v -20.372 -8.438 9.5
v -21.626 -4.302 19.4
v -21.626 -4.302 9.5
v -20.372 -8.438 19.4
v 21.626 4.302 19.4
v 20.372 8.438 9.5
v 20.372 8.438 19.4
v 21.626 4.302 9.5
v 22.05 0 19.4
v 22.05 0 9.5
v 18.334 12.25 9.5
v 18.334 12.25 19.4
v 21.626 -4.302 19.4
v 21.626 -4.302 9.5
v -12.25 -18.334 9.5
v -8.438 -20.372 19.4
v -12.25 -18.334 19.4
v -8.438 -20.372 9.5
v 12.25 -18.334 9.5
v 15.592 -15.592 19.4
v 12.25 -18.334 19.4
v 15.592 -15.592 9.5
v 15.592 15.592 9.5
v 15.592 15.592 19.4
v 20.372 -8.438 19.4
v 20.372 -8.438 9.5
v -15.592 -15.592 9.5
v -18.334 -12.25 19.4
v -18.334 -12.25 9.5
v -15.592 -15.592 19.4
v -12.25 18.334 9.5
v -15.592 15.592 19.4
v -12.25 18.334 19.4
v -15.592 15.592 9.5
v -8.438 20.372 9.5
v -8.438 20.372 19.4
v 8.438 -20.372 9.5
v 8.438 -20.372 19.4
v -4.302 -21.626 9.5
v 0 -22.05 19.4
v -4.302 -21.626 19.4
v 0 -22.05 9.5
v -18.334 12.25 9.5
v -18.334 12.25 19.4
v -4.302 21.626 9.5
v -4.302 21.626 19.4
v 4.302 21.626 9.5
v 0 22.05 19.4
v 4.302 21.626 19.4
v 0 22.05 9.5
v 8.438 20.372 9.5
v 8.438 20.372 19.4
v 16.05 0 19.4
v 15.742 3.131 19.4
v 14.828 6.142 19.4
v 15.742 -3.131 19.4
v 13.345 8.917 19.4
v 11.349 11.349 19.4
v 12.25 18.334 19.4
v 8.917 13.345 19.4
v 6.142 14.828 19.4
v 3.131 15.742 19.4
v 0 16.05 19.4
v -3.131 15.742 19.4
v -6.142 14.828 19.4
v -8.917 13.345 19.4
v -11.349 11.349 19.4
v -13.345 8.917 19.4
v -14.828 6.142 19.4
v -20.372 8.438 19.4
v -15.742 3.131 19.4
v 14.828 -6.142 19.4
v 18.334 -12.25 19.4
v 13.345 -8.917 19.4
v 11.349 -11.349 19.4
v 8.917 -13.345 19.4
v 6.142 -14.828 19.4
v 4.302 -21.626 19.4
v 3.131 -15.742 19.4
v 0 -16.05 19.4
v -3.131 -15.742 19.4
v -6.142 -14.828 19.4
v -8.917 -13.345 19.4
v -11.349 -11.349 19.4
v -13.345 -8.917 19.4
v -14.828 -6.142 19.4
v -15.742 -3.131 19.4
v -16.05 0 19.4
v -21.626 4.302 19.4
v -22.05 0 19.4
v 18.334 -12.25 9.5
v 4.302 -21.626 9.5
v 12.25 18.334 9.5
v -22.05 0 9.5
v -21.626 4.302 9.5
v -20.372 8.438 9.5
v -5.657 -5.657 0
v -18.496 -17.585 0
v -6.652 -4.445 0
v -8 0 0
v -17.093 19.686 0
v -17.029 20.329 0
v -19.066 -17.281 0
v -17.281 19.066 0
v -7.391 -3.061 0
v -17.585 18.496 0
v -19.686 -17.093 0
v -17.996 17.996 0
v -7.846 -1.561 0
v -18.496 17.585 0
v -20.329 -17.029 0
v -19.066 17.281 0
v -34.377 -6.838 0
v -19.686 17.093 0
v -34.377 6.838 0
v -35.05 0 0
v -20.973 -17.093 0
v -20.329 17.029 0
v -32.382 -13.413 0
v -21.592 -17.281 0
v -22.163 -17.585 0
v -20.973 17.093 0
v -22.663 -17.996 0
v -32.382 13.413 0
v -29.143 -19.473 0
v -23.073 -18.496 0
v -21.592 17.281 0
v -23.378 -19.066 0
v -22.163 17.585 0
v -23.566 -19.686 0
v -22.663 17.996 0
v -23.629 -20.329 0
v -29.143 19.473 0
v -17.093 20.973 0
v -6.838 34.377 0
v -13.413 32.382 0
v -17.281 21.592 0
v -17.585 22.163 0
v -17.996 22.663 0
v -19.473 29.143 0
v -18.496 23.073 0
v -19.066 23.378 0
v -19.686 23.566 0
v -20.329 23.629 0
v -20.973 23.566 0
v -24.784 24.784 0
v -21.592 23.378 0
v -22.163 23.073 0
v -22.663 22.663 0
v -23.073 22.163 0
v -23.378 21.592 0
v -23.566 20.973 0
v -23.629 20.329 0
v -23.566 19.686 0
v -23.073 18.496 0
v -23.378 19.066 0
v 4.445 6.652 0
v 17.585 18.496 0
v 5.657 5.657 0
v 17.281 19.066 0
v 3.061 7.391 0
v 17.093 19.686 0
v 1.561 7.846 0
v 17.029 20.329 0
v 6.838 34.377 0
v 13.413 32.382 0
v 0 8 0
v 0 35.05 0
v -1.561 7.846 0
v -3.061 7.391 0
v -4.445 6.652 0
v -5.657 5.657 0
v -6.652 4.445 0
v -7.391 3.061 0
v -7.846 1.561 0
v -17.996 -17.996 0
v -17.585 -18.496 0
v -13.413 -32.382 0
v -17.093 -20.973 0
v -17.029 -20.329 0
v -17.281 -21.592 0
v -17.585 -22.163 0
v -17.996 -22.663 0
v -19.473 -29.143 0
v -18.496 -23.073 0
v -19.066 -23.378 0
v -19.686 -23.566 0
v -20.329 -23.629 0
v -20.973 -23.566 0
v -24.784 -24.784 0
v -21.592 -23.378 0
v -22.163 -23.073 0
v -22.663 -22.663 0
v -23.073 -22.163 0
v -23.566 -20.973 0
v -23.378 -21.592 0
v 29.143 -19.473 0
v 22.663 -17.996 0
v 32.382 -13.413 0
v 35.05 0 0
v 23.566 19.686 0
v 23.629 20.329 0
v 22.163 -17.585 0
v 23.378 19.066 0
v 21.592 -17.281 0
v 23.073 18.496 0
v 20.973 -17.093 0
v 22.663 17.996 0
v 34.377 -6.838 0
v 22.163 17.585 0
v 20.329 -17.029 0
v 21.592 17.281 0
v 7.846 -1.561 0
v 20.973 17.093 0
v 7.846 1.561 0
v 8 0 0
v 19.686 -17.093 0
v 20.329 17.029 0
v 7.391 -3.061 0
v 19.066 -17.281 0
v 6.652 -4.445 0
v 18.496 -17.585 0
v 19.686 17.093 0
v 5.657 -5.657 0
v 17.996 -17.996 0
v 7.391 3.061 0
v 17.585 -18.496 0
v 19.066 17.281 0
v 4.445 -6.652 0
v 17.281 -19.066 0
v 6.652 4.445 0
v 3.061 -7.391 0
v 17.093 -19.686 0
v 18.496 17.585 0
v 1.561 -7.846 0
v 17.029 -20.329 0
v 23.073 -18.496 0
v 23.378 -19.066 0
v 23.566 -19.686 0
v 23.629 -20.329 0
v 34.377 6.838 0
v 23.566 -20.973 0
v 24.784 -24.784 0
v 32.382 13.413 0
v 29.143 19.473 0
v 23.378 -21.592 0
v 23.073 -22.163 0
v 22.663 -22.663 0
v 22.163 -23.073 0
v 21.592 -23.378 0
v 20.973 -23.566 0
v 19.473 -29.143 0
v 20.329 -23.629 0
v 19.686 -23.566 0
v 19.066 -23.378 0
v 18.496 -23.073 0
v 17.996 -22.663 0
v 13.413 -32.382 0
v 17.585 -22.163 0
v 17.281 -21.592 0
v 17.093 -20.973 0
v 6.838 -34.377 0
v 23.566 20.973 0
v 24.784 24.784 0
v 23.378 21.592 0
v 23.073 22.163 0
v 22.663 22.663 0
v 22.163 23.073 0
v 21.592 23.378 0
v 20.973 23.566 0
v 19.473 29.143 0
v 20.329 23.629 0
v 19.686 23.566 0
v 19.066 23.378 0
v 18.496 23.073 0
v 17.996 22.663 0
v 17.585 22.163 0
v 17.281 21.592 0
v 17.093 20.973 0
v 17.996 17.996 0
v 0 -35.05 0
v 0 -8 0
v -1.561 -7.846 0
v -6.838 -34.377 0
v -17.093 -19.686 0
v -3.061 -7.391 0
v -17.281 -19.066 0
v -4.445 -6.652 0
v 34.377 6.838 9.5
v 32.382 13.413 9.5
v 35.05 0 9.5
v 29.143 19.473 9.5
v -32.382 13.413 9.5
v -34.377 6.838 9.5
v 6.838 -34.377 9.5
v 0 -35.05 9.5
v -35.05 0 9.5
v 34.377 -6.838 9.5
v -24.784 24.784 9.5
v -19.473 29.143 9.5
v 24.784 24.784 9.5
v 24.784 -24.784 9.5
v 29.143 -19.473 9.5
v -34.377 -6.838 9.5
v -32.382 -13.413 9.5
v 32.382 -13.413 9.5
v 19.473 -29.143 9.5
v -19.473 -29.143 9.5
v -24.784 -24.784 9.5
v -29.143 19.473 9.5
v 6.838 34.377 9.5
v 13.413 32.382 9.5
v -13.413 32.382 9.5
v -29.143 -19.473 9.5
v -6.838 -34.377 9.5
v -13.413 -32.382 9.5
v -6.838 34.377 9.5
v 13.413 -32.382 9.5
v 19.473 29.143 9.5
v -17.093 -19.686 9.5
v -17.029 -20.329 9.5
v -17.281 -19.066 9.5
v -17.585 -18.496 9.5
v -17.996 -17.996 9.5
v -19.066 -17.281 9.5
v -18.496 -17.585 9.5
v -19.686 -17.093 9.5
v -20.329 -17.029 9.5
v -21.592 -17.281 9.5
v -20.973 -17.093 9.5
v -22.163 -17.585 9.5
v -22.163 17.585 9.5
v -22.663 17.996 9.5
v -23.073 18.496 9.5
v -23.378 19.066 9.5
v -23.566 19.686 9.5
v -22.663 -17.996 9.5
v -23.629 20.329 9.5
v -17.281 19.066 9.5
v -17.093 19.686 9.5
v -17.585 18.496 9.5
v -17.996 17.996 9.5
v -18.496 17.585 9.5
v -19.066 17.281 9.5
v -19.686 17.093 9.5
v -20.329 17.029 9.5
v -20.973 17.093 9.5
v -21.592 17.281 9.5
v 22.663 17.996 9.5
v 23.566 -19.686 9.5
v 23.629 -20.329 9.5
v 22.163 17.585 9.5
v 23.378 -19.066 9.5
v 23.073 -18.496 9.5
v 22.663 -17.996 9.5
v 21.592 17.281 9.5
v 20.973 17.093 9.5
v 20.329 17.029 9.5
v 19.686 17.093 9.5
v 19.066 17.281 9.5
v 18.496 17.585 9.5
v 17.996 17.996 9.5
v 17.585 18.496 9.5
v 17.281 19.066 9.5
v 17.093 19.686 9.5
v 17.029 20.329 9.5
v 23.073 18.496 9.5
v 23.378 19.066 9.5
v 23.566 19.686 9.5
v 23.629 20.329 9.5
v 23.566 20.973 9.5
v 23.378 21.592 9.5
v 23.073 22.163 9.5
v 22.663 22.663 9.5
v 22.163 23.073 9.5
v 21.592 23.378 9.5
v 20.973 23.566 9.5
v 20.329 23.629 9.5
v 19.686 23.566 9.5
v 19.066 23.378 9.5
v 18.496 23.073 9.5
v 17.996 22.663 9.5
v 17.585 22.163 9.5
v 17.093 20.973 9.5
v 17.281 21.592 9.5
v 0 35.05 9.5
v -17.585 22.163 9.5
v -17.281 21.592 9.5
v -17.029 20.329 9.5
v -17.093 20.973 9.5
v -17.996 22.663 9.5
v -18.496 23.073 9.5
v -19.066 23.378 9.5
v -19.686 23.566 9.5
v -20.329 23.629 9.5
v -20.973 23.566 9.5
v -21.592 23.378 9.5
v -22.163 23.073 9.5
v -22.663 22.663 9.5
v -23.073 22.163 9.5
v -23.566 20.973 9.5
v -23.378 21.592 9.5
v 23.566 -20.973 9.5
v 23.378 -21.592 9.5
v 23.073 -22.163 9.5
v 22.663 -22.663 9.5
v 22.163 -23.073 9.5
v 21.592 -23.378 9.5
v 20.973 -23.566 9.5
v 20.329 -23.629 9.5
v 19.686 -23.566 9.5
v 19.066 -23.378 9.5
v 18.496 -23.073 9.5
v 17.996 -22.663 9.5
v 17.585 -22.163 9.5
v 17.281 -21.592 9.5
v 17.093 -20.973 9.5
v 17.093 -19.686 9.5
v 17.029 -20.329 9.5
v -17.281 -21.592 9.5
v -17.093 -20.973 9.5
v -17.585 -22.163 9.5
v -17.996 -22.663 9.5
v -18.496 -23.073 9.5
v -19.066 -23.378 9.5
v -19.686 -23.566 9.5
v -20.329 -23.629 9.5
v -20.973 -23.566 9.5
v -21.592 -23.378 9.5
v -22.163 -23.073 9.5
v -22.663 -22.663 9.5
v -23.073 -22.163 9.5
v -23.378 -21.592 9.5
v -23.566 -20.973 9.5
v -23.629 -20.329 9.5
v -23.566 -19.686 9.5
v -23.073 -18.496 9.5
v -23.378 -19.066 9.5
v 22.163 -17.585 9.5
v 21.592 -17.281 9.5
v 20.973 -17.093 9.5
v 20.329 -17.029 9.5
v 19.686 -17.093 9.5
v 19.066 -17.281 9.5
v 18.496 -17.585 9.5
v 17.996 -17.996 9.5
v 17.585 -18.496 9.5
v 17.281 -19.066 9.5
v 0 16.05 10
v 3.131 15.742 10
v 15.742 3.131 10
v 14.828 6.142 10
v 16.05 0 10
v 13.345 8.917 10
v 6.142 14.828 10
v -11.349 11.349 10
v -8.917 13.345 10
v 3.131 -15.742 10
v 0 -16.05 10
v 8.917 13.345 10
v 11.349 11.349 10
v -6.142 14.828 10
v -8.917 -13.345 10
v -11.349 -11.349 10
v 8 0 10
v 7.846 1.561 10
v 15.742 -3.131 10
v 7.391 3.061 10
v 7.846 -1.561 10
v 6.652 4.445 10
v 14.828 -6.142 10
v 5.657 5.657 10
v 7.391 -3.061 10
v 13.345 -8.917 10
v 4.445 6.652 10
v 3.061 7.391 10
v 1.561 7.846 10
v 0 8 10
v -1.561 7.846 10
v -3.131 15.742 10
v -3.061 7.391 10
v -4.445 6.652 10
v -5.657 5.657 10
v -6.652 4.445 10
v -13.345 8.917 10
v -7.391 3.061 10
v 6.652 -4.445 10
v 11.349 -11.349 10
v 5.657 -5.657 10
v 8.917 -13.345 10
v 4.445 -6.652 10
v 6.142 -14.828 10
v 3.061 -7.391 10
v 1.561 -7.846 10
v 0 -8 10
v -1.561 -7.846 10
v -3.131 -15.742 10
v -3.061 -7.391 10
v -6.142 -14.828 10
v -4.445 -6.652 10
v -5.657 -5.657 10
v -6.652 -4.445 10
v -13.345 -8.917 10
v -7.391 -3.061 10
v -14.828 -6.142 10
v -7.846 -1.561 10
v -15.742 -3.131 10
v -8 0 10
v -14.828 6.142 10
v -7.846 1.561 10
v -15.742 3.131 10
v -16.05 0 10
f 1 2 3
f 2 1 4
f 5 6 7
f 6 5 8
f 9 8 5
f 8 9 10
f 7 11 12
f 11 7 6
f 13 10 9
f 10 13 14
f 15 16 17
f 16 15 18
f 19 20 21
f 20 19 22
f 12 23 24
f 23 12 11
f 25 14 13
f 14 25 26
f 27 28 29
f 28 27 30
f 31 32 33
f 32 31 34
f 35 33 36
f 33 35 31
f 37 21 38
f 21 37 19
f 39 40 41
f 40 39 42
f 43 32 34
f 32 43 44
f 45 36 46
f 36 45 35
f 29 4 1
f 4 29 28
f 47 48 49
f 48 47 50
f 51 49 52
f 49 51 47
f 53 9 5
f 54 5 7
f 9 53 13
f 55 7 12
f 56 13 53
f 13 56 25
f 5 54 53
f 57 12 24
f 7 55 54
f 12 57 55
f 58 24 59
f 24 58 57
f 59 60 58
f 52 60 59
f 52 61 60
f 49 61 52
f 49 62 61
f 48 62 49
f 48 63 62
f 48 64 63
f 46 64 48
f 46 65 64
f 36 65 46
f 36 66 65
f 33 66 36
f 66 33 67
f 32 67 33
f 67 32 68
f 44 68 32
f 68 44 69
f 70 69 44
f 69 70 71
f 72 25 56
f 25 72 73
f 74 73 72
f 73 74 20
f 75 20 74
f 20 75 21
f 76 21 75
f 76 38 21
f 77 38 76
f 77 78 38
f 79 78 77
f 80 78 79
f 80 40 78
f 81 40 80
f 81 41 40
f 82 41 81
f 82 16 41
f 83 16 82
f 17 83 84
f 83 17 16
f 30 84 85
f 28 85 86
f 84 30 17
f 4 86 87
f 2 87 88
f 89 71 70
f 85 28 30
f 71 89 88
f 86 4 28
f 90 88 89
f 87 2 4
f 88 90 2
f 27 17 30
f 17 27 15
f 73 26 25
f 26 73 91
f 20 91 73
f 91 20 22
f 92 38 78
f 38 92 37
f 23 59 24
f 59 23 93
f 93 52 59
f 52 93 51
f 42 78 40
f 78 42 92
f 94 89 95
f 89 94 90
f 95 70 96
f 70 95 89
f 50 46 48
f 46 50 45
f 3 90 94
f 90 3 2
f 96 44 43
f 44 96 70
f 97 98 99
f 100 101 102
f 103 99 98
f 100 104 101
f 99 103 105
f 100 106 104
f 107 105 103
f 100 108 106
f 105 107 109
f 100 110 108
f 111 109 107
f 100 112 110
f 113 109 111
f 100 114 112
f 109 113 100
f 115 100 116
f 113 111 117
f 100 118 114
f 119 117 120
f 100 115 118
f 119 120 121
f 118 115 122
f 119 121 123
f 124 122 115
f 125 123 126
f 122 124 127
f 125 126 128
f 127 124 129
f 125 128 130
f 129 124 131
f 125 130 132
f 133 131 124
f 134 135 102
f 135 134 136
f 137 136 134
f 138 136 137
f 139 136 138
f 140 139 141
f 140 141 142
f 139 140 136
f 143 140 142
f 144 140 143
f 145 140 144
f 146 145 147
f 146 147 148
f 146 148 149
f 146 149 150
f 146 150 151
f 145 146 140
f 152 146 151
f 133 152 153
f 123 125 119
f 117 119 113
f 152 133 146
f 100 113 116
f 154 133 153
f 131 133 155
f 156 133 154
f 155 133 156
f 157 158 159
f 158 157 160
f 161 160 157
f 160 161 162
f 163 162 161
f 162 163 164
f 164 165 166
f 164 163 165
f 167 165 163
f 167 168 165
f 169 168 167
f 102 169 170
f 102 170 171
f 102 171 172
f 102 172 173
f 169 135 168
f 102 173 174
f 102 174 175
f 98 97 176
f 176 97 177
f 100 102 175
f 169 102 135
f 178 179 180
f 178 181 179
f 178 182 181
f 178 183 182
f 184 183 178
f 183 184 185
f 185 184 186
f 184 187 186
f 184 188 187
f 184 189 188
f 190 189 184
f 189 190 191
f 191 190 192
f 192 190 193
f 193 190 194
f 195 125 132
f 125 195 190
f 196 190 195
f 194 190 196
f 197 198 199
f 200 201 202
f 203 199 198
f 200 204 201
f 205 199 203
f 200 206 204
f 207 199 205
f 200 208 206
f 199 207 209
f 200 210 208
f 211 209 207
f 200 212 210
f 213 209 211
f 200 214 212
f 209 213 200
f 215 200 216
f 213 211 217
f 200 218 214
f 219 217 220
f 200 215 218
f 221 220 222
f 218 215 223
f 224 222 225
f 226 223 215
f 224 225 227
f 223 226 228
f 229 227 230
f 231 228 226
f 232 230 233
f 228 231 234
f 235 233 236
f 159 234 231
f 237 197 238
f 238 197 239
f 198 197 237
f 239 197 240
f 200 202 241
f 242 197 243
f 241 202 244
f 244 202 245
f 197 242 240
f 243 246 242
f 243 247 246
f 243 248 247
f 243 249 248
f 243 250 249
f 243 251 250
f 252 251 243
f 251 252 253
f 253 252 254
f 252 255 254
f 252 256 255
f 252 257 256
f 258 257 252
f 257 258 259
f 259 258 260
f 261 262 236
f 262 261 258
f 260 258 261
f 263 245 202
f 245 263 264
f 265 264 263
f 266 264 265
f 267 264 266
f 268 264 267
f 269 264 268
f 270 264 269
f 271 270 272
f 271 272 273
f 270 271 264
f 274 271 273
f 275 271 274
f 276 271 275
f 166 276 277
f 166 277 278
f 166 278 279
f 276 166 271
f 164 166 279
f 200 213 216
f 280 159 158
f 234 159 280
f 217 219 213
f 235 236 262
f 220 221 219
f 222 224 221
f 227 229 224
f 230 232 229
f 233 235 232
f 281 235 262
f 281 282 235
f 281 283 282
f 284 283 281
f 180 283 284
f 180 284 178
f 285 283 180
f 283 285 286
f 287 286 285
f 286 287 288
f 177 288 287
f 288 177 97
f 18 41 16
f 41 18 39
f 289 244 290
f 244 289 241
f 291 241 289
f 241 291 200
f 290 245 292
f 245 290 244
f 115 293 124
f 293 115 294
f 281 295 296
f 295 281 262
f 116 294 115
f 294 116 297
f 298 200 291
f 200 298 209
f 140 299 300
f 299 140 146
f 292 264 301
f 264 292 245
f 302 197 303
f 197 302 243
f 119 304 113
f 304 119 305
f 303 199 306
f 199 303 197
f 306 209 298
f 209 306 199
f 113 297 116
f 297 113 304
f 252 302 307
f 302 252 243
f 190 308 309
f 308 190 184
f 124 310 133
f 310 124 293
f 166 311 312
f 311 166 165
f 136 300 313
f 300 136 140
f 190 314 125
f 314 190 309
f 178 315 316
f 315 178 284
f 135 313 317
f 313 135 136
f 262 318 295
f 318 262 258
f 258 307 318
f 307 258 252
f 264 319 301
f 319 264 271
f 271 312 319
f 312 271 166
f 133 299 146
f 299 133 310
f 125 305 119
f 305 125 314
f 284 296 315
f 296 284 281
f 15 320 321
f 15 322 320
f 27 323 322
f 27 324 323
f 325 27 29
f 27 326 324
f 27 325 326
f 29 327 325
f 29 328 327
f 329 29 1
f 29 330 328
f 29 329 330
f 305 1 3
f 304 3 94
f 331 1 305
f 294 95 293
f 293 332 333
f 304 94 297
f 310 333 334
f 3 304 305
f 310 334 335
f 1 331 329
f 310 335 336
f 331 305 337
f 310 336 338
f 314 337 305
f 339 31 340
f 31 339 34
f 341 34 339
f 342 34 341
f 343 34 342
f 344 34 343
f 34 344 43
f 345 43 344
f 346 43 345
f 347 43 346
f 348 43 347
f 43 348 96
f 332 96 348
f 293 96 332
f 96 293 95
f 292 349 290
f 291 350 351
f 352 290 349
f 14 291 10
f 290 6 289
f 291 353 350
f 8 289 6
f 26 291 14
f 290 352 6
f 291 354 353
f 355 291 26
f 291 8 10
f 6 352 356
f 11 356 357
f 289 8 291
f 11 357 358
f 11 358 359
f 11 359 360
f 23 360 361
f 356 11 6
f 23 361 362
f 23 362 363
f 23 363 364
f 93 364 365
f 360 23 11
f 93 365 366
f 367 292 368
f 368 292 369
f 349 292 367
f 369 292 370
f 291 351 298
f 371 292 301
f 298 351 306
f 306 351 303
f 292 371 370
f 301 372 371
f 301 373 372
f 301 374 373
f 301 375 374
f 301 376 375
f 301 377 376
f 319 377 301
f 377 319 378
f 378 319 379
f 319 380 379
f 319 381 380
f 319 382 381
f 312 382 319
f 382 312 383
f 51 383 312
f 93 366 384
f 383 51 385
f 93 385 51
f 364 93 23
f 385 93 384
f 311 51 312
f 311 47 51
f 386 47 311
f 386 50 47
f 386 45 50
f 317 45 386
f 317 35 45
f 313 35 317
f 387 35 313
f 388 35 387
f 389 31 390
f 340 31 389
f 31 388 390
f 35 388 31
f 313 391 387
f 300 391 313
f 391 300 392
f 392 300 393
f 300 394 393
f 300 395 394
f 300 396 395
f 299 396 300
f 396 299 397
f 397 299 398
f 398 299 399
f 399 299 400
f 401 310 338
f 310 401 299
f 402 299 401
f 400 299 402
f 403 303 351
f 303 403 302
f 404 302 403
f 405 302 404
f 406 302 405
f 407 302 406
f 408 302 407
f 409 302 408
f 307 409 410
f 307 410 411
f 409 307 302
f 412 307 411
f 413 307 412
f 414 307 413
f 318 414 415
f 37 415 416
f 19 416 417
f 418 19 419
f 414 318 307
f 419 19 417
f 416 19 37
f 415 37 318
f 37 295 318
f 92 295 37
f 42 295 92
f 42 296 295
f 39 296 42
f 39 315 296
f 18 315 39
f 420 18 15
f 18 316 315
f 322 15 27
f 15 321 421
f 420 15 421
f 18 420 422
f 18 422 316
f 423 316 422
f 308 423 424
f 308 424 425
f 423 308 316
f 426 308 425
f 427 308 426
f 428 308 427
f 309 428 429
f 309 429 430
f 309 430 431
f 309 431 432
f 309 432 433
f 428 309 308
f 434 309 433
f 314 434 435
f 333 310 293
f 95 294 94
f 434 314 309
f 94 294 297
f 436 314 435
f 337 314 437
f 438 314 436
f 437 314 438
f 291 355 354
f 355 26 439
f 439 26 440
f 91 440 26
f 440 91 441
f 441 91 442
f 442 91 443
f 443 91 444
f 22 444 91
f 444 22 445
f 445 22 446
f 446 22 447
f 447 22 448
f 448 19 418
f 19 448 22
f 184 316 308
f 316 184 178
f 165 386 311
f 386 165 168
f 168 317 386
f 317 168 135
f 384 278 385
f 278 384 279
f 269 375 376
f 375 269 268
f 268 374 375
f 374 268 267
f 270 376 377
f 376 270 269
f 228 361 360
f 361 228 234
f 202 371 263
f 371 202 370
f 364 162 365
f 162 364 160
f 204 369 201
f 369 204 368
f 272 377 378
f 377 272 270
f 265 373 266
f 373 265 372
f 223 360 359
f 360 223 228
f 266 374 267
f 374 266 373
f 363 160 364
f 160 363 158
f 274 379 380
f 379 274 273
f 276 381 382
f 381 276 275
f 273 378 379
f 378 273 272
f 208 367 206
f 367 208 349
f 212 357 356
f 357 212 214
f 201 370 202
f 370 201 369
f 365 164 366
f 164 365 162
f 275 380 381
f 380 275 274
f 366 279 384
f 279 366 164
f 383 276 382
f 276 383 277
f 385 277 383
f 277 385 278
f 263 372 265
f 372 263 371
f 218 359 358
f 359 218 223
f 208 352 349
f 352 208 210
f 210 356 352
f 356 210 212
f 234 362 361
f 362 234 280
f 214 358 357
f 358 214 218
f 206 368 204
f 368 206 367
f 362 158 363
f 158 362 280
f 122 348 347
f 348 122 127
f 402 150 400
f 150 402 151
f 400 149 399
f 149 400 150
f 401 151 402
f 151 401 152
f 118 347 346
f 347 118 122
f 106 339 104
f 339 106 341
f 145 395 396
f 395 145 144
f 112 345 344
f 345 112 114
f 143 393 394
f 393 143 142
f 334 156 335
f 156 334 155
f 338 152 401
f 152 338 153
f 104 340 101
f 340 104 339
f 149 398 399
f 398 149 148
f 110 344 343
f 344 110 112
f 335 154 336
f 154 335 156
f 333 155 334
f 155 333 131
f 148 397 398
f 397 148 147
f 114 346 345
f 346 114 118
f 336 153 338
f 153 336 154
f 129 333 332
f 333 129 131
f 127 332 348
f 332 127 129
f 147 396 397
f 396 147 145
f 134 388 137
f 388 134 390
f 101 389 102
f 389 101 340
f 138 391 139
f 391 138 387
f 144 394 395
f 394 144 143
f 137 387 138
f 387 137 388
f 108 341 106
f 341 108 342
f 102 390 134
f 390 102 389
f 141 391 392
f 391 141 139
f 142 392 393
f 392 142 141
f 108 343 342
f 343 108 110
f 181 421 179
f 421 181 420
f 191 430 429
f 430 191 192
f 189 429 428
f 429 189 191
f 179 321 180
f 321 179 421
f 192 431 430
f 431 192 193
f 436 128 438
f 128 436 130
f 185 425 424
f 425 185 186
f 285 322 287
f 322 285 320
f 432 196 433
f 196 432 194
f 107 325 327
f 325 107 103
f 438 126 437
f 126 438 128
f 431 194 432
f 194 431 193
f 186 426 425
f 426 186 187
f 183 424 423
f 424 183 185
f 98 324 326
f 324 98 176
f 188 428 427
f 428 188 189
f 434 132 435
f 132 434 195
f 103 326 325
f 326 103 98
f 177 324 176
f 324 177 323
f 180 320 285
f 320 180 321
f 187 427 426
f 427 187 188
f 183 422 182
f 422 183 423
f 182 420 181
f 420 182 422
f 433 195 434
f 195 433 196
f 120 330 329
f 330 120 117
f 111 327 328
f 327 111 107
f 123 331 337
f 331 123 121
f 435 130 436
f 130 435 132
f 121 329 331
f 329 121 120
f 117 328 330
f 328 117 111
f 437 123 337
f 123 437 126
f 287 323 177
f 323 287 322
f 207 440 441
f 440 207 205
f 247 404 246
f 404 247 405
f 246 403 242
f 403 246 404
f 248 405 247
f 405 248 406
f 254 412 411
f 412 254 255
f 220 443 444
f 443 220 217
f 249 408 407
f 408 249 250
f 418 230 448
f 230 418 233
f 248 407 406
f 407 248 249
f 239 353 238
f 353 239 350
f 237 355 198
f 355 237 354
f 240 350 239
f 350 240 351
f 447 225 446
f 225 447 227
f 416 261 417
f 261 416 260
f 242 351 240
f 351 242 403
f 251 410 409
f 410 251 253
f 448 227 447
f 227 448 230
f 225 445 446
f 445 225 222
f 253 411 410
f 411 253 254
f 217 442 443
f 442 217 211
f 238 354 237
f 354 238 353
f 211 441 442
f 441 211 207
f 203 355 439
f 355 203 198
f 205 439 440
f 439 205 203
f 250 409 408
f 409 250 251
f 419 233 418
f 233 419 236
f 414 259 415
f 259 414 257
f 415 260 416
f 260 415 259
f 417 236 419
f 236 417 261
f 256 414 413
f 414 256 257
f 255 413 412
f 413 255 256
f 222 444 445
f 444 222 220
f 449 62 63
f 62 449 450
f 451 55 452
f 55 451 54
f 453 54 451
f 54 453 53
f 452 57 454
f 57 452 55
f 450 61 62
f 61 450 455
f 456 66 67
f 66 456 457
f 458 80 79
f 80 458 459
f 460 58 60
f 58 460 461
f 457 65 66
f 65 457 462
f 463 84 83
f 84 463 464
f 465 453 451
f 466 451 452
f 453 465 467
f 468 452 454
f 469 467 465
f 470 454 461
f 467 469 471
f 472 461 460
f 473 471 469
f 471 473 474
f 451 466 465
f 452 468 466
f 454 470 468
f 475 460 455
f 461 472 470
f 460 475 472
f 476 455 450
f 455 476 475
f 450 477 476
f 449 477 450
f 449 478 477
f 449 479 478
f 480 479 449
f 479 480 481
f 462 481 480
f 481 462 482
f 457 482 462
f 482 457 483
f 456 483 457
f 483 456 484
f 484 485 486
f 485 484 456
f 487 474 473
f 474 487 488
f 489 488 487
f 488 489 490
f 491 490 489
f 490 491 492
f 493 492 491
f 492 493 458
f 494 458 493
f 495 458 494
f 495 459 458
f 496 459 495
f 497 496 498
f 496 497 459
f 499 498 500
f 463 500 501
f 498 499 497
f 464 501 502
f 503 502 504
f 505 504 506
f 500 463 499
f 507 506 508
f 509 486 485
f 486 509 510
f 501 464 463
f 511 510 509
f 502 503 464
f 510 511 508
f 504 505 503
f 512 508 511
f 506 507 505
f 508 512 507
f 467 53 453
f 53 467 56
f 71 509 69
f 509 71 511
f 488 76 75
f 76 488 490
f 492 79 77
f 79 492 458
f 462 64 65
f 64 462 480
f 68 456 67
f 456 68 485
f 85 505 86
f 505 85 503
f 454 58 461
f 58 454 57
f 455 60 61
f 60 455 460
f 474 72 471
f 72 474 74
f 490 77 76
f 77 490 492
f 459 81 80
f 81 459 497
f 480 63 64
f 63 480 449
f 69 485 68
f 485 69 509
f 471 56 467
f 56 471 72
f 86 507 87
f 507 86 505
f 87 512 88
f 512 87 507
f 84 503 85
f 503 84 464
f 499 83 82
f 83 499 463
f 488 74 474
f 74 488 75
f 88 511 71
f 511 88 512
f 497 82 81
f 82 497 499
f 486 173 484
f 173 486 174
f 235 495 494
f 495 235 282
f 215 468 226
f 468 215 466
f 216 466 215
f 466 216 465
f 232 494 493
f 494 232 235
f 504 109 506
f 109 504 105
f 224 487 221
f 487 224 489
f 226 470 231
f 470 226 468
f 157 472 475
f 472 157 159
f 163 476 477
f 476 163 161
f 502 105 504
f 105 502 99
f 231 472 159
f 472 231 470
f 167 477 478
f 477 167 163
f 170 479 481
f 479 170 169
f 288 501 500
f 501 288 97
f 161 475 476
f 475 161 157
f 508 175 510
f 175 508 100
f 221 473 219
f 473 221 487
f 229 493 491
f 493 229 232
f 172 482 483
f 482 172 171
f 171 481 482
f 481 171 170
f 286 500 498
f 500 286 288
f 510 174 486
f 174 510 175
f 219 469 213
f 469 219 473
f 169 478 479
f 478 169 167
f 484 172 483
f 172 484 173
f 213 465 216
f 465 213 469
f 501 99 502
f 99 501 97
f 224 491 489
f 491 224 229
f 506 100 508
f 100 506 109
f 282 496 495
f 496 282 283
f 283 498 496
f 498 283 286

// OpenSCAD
$fn = 32;

// ----------------------------------------------------------------------
// Bearing housing: seat for 6002 (32 x 9 mm), 44.1 mm body
// ----------------------------------------------------------------------

// --- parameters (mm) ---
housing_d = 44.1;         // housing outside diameter
housing_h = 19.4;         // overall housing height
wall_t = 6;               // wall thickness
seat_d = 32.1;            // 6002 seat, 0.1 mm clearance
seat_h = 9.4;             // pocket depth
shoulder = 2;             // shoulder under the bearing
pass_d = 16;              // shaft passage
flange_d = 70.1;          // mounting flange diameter
flange_t = 8;             // flange thickness
bolt_d = 6.6;             // flange bolt clearance
bolt_r = 28.75;           // flange bolt circle radius

module body() {
  cylinder(h = housing_h, d = housing_d);
}

module flange() {
  /* flange sunk 1.5 mm into the body */
  cylinder(h = flange_t + 1.5, d = flange_d);
}

difference() {
  union() {
    body();
    flange();
  }
  translate([0, 0, housing_h - seat_h]) cylinder(h = seat_h + 1, d = seat_d);
  translate([0, 0, -1]) cylinder(h = housing_h - seat_h + 1, d = pass_d);
  for (i = [0 : 3]) rotate([0, 0, 45 + i * 90]) translate([bolt_r, 0, -1])
    cylinder(h = flange_t + 3, d = bolt_d);
}
